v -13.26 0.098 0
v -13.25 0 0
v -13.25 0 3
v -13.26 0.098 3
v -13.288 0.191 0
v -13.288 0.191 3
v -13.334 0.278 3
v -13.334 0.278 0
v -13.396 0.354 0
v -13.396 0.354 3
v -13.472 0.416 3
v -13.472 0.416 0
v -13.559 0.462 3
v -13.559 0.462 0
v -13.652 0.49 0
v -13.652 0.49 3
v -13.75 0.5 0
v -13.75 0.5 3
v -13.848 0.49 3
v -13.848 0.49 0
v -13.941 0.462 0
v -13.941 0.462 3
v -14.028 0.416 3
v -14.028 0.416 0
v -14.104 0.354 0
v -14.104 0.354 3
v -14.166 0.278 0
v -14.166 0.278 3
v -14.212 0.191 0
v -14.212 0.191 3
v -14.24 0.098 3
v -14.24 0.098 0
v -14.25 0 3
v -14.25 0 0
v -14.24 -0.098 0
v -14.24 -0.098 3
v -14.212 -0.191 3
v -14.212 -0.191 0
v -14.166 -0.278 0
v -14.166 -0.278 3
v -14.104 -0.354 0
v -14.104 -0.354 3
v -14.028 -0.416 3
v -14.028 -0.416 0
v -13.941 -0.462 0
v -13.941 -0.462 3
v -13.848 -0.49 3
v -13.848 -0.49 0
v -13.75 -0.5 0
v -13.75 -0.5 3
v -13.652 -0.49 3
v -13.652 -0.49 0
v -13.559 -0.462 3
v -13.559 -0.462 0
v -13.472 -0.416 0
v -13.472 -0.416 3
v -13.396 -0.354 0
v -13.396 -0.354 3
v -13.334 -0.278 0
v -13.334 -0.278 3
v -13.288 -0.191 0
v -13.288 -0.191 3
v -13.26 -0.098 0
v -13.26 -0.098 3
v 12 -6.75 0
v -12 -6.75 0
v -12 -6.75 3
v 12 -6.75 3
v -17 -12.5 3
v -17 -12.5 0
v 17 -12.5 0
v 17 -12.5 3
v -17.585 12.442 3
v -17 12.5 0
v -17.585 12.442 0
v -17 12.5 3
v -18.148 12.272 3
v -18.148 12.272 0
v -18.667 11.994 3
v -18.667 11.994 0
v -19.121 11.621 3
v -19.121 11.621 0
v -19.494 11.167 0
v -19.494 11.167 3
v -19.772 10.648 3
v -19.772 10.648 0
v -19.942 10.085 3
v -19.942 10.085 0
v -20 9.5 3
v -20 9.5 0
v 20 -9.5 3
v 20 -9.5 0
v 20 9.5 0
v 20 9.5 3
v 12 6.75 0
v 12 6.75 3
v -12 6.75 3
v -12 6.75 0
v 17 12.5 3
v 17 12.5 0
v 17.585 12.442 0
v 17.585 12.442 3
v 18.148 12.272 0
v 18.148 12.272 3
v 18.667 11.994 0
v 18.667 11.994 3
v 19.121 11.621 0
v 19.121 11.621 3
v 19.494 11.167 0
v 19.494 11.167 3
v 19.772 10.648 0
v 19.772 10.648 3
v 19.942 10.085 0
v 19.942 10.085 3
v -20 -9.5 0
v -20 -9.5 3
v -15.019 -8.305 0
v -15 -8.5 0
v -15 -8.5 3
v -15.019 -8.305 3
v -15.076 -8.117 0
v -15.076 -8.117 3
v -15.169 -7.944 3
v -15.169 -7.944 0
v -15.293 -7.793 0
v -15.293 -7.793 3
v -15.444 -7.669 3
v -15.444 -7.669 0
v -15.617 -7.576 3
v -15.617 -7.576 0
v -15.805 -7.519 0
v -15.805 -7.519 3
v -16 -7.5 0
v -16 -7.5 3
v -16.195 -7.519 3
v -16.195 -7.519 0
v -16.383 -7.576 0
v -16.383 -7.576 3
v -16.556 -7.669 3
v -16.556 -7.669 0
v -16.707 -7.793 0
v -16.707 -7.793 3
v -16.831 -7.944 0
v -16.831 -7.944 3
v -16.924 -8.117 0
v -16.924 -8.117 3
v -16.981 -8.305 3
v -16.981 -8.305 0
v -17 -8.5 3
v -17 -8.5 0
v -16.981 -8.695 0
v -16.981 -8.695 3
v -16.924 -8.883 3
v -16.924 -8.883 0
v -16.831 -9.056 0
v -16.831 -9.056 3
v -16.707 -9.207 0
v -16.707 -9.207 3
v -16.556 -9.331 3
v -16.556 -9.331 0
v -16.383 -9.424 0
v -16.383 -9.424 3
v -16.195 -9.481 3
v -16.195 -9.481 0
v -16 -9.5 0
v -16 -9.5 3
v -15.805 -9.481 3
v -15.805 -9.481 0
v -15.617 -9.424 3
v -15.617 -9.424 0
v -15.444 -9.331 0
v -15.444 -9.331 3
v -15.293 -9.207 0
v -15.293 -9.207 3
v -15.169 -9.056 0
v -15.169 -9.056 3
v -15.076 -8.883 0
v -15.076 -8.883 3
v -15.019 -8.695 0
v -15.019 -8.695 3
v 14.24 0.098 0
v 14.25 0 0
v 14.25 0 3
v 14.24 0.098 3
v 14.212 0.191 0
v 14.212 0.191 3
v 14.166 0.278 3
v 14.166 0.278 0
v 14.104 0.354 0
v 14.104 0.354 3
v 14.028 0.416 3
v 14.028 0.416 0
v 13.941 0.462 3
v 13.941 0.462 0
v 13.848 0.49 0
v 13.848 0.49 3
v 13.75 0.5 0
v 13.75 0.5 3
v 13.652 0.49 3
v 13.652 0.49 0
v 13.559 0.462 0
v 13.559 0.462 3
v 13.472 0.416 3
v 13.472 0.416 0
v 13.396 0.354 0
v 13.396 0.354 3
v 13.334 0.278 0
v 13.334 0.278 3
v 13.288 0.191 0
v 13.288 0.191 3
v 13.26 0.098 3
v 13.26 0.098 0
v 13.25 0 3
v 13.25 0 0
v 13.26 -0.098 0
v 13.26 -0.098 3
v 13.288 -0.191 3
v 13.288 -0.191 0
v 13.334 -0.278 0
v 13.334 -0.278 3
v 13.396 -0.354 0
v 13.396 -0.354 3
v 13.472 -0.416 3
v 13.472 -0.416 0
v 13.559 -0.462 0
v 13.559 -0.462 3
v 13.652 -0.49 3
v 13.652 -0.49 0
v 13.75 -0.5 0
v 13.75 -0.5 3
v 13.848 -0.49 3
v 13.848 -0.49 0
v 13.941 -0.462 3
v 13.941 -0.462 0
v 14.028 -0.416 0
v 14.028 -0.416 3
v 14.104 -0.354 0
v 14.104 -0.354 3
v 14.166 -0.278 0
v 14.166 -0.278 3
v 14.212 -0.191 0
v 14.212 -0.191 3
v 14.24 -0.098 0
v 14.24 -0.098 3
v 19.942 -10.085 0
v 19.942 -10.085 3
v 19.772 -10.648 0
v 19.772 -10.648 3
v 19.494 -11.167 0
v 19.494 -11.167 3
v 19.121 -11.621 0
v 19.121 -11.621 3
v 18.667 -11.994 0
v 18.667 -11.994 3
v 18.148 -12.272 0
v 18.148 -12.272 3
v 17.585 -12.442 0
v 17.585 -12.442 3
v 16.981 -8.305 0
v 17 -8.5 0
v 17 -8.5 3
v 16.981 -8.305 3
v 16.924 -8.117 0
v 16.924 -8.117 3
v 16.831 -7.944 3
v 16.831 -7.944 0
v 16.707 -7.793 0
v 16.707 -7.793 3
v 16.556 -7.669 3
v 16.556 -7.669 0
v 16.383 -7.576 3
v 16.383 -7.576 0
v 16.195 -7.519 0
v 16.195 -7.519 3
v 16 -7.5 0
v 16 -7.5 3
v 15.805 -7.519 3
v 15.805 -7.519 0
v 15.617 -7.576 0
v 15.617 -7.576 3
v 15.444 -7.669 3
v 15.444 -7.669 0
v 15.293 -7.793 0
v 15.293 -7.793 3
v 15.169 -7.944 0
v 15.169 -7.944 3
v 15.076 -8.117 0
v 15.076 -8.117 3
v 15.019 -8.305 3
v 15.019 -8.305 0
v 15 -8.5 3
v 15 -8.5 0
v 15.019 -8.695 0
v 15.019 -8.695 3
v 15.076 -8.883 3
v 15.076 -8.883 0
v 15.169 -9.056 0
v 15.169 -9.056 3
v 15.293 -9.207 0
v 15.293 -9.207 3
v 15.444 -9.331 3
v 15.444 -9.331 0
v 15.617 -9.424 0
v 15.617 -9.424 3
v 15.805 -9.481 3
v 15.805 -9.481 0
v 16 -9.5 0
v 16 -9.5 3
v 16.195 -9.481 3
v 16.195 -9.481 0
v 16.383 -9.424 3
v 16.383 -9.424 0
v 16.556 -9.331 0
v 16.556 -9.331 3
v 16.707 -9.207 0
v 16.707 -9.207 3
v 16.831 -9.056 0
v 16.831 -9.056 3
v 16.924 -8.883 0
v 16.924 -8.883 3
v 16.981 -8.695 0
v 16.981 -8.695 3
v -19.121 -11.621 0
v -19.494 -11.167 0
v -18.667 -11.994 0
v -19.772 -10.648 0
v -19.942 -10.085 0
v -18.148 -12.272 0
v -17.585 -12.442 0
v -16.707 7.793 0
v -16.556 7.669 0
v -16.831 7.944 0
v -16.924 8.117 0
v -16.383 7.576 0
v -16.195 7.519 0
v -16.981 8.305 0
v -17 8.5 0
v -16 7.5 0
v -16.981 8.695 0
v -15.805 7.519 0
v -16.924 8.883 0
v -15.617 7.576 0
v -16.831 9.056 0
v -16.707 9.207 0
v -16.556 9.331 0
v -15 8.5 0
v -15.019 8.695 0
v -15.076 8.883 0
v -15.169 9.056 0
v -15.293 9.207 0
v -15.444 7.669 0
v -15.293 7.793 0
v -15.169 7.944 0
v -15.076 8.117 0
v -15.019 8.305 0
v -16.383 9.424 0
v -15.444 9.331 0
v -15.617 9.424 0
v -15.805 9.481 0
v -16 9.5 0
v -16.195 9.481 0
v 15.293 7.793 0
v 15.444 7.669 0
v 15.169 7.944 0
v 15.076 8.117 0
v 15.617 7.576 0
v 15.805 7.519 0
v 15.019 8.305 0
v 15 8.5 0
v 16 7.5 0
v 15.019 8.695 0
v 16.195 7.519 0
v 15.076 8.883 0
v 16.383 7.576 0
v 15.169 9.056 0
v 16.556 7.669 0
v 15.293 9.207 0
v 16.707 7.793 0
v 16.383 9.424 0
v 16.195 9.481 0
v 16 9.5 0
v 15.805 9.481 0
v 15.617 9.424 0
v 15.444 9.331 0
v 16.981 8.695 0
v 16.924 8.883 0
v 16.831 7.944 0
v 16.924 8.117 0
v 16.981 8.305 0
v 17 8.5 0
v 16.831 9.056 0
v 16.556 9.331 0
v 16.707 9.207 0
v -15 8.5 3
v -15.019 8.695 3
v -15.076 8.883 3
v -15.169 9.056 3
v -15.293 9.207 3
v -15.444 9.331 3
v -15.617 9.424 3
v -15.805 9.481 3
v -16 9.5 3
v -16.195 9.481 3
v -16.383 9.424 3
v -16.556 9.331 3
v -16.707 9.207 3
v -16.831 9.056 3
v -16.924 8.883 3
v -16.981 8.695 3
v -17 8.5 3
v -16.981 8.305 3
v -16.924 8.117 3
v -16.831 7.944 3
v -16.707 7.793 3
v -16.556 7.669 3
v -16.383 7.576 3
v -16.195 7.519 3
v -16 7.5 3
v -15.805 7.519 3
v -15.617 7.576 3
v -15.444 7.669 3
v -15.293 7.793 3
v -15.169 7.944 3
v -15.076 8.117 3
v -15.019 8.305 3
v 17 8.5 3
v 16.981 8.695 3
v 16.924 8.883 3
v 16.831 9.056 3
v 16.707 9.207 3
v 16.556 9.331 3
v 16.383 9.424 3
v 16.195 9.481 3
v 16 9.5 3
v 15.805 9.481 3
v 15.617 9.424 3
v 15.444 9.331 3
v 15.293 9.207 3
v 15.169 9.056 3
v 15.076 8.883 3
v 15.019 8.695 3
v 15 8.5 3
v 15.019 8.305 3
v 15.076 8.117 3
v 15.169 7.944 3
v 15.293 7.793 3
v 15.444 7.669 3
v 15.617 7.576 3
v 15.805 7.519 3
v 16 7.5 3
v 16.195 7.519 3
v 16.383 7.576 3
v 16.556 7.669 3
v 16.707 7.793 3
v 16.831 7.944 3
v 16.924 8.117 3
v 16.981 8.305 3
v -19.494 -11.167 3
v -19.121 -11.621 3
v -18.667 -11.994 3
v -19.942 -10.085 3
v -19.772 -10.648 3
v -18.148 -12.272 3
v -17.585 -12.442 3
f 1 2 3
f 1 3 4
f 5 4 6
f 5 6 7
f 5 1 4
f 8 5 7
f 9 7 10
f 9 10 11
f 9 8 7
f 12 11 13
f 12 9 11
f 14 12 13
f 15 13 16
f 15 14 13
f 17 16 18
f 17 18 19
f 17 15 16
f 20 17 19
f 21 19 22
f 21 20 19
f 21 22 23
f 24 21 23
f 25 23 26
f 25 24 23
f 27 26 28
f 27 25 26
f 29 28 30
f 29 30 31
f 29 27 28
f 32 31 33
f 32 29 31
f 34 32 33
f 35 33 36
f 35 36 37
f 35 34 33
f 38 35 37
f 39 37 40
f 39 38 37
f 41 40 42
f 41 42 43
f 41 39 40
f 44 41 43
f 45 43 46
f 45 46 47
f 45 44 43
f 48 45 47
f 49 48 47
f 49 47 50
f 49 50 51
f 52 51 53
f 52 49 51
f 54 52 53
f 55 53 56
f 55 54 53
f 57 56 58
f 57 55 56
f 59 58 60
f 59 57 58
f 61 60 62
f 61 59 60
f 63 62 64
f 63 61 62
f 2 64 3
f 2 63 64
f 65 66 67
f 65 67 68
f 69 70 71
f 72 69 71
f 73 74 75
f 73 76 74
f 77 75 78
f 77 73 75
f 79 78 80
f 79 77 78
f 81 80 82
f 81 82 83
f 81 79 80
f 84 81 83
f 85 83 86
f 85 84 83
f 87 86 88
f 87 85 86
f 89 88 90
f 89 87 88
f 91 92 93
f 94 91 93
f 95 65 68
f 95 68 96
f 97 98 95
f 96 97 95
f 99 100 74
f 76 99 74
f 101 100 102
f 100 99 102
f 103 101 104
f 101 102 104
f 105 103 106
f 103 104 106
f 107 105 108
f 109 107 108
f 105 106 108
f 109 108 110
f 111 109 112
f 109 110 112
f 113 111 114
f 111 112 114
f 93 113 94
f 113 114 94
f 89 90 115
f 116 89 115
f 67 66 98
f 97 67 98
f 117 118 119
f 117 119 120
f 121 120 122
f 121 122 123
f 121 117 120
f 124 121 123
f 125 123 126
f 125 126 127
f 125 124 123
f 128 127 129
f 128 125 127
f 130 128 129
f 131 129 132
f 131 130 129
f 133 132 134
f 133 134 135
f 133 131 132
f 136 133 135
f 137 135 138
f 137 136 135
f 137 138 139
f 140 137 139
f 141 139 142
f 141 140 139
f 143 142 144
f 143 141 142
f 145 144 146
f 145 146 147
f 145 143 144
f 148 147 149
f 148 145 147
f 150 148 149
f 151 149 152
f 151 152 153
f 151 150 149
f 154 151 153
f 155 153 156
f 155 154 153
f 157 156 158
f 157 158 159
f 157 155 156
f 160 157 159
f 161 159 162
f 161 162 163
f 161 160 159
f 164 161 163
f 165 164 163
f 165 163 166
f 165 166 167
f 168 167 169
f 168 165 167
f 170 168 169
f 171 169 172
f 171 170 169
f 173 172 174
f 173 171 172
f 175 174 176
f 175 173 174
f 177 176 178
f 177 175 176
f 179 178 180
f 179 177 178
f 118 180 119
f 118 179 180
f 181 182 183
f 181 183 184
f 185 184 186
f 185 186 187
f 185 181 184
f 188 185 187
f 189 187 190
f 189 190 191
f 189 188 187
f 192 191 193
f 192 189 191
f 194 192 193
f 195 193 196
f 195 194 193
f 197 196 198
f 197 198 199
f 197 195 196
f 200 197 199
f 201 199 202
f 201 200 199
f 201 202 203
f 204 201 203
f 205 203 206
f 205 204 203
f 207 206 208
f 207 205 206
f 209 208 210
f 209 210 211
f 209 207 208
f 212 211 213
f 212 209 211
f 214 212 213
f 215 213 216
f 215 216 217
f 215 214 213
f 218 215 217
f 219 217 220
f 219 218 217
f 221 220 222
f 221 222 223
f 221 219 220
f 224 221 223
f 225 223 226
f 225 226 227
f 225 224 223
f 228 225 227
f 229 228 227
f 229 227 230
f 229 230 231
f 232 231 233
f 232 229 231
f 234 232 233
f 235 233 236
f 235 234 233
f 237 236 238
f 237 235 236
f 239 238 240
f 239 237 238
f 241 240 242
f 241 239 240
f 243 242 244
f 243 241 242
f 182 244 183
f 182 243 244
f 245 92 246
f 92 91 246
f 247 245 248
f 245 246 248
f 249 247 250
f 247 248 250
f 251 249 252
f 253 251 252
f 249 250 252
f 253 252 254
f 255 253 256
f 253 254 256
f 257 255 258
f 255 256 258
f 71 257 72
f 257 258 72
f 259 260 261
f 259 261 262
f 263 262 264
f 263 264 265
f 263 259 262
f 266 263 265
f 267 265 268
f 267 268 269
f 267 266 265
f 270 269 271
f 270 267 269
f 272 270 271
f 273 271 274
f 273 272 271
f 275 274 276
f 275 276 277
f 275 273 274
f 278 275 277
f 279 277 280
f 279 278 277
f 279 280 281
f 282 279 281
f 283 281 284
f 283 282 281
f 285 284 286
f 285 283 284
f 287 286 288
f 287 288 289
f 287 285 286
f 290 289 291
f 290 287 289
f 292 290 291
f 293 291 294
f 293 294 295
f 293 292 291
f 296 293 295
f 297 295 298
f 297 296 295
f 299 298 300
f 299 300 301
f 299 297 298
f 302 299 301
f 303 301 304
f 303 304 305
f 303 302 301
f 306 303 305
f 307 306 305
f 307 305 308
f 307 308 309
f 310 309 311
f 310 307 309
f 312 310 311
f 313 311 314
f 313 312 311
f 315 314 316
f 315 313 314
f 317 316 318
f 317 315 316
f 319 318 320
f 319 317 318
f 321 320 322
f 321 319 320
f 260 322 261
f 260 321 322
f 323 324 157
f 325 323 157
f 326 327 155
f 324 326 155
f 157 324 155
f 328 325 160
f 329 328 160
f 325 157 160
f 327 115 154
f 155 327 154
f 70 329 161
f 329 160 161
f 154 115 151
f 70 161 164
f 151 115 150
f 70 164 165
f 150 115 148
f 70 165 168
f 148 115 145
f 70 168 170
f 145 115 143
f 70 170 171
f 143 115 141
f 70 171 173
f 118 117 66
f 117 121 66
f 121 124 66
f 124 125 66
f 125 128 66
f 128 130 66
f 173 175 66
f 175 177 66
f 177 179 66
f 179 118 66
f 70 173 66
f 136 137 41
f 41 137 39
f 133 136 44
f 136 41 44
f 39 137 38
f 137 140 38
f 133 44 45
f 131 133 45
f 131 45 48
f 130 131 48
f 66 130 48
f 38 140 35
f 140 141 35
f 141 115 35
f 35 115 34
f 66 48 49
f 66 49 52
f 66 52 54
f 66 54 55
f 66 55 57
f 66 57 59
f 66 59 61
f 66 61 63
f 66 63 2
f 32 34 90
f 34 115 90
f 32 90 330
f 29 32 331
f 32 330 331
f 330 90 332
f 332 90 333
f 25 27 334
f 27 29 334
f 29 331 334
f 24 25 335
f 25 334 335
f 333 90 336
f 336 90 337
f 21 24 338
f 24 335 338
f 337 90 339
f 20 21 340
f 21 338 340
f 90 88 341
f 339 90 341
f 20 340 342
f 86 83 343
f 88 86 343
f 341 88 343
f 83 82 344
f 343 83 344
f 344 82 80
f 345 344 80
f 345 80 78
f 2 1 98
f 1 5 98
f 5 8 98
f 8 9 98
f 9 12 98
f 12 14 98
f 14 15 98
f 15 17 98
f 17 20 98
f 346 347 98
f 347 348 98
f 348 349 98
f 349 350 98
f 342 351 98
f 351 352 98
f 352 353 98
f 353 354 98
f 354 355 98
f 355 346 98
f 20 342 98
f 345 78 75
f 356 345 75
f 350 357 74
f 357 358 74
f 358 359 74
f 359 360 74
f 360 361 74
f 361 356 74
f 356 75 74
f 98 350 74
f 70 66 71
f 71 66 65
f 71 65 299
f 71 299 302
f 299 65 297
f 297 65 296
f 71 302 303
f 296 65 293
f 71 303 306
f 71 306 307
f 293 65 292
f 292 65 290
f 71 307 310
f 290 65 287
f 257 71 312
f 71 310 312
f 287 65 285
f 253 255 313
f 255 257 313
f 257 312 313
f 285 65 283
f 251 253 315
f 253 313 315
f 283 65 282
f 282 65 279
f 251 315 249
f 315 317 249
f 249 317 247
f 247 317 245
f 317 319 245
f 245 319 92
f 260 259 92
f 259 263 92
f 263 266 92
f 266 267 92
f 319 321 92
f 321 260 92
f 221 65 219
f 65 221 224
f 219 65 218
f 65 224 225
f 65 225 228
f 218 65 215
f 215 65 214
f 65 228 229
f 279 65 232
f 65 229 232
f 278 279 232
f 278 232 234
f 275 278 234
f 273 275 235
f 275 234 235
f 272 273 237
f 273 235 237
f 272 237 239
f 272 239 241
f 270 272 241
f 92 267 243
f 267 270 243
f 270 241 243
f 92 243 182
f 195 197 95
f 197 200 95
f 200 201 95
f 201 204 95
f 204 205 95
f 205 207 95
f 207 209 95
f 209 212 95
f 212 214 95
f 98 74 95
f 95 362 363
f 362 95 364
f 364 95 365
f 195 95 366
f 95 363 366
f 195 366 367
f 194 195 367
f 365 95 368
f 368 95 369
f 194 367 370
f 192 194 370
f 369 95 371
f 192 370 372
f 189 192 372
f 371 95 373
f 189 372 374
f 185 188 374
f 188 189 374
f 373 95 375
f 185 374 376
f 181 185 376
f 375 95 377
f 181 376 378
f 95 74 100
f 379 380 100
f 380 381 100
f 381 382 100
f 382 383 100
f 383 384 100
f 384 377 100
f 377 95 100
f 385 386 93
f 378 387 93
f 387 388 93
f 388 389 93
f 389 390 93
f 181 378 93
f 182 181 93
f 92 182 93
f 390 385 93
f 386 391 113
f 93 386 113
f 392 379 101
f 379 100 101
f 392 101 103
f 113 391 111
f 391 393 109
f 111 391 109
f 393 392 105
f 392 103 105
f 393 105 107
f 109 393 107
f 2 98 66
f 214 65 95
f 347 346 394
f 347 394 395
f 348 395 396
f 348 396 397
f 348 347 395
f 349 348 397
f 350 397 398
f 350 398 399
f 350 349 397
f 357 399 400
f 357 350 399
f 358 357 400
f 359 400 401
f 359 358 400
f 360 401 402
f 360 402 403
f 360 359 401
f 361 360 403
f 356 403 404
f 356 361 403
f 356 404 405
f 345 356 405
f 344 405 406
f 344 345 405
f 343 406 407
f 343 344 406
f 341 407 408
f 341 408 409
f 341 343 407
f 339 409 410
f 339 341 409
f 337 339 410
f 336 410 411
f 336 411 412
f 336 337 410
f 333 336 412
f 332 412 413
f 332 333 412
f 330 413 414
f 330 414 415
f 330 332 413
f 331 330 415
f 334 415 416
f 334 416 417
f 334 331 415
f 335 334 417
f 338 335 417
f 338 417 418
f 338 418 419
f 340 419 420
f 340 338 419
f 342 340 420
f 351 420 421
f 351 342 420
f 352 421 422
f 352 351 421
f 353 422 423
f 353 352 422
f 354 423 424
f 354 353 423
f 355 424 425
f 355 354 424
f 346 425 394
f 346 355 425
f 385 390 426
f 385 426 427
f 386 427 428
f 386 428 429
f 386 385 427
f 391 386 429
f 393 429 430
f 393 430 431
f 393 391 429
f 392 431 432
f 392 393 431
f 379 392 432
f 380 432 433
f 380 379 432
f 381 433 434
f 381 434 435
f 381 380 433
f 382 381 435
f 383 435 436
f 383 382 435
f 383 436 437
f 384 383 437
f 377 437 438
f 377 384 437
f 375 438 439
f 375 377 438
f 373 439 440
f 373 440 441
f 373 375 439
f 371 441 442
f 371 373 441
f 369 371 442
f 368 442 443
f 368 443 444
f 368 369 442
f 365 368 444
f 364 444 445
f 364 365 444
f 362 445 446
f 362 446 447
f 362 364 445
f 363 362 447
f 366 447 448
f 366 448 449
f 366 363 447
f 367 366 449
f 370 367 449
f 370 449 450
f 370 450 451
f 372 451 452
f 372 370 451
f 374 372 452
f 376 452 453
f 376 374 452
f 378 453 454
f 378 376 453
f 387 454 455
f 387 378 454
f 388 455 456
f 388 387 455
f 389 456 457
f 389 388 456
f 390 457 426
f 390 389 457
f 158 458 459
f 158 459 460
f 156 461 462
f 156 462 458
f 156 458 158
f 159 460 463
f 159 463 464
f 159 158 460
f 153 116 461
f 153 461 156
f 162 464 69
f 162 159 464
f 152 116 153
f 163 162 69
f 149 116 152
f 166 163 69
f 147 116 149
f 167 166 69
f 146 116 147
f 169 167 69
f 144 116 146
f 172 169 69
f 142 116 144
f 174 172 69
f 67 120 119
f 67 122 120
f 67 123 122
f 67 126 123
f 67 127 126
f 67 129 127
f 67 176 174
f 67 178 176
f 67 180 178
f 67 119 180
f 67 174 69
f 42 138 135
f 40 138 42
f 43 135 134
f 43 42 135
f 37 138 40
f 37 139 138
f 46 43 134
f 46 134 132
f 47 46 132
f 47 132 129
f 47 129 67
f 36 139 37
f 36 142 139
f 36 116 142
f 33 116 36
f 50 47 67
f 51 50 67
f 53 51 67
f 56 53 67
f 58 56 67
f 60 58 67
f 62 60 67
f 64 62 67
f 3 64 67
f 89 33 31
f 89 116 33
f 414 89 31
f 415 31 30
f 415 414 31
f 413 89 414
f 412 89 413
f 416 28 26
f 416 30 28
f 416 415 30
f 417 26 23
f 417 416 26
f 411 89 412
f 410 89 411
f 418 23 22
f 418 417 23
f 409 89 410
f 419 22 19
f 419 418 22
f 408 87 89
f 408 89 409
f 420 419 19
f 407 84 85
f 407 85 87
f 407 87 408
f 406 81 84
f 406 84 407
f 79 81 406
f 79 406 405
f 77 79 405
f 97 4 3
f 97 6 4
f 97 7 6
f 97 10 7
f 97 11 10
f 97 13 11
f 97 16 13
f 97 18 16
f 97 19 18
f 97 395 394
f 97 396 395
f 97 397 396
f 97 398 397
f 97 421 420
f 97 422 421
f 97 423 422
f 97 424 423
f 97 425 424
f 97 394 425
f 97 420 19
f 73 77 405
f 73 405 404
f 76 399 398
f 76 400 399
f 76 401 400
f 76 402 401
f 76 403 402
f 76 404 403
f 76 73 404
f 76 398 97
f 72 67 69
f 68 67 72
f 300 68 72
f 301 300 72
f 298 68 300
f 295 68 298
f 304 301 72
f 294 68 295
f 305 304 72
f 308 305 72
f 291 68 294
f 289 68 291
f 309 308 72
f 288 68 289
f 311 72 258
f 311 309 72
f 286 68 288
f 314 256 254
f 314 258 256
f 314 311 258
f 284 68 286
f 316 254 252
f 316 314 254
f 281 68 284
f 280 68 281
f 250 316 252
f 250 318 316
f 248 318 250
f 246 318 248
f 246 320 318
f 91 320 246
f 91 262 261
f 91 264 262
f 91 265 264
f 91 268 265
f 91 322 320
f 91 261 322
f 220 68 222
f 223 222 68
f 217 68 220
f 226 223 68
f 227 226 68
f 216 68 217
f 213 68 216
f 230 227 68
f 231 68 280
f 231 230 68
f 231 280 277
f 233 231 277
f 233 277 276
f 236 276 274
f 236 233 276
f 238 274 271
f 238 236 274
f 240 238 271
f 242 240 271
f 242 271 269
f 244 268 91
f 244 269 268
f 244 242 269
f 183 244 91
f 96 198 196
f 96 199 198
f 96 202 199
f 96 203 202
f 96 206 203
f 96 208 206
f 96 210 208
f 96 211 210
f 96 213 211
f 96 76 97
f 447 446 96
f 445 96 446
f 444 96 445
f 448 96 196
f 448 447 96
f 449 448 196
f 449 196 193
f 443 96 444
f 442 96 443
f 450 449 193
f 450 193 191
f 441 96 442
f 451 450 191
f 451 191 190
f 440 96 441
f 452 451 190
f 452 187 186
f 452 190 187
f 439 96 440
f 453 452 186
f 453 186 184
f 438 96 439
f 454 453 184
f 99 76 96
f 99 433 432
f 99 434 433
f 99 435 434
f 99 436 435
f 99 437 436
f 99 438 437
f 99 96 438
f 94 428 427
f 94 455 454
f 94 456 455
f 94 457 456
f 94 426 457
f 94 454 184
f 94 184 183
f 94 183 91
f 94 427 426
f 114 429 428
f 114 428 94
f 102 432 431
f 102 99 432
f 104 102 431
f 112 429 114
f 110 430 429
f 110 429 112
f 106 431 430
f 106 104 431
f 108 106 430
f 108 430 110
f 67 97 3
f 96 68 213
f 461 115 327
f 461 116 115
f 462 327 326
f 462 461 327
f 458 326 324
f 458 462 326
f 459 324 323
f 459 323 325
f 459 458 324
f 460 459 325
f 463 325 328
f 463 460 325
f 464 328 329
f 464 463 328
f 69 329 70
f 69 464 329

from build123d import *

# Parameters (mm, degrees)
F0_R     = 1
F0_R_2   = 0.5
F0_W     = 24
F0_H     = 13.5
F1_DEPTH = 3
F2_R     = 3


with BuildPart() as f1:
    # F0 (on Top) → F1 (new body)
    with BuildSketch(Plane.XY):
        Polygon((20, -8.5), (20, 12.5), (16, 12.5), (-20, 12.5), (-20, -8.5), (-20, -12.5), (-16, -12.5), (16, -12.5), (20, -12.5), align=None)
        with Locations((-16, -8.5)):
            Circle(F0_R, mode=Mode.SUBTRACT)
        with Locations((16, -8.5)):
            Circle(F0_R, mode=Mode.SUBTRACT)
        with Locations((-13.75, 0)):
            Circle(F0_R_2, mode=Mode.SUBTRACT)
        with Locations((-16, 8.5)):
            Circle(F0_R, mode=Mode.SUBTRACT)
        Rectangle(F0_W, F0_H, mode=Mode.SUBTRACT)
        with Locations((13.75, 0)):
            Circle(F0_R_2, mode=Mode.SUBTRACT)
        with Locations((16, 8.5)):
            Circle(F0_R, mode=Mode.SUBTRACT)
    extrude(amount=F1_DEPTH)

    # F2
    f2_edges = [f1.edges().sort_by_distance(p)[0] for p in [
        (20, -12.5, 1.5),
        (-20, -12.5, 1.5),
        (20, 12.5, 1.5),
        (-20, 12.5, 1.5),
    ]]
    fillet(f2_edges, radius=F2_R)


solid = f1.part
